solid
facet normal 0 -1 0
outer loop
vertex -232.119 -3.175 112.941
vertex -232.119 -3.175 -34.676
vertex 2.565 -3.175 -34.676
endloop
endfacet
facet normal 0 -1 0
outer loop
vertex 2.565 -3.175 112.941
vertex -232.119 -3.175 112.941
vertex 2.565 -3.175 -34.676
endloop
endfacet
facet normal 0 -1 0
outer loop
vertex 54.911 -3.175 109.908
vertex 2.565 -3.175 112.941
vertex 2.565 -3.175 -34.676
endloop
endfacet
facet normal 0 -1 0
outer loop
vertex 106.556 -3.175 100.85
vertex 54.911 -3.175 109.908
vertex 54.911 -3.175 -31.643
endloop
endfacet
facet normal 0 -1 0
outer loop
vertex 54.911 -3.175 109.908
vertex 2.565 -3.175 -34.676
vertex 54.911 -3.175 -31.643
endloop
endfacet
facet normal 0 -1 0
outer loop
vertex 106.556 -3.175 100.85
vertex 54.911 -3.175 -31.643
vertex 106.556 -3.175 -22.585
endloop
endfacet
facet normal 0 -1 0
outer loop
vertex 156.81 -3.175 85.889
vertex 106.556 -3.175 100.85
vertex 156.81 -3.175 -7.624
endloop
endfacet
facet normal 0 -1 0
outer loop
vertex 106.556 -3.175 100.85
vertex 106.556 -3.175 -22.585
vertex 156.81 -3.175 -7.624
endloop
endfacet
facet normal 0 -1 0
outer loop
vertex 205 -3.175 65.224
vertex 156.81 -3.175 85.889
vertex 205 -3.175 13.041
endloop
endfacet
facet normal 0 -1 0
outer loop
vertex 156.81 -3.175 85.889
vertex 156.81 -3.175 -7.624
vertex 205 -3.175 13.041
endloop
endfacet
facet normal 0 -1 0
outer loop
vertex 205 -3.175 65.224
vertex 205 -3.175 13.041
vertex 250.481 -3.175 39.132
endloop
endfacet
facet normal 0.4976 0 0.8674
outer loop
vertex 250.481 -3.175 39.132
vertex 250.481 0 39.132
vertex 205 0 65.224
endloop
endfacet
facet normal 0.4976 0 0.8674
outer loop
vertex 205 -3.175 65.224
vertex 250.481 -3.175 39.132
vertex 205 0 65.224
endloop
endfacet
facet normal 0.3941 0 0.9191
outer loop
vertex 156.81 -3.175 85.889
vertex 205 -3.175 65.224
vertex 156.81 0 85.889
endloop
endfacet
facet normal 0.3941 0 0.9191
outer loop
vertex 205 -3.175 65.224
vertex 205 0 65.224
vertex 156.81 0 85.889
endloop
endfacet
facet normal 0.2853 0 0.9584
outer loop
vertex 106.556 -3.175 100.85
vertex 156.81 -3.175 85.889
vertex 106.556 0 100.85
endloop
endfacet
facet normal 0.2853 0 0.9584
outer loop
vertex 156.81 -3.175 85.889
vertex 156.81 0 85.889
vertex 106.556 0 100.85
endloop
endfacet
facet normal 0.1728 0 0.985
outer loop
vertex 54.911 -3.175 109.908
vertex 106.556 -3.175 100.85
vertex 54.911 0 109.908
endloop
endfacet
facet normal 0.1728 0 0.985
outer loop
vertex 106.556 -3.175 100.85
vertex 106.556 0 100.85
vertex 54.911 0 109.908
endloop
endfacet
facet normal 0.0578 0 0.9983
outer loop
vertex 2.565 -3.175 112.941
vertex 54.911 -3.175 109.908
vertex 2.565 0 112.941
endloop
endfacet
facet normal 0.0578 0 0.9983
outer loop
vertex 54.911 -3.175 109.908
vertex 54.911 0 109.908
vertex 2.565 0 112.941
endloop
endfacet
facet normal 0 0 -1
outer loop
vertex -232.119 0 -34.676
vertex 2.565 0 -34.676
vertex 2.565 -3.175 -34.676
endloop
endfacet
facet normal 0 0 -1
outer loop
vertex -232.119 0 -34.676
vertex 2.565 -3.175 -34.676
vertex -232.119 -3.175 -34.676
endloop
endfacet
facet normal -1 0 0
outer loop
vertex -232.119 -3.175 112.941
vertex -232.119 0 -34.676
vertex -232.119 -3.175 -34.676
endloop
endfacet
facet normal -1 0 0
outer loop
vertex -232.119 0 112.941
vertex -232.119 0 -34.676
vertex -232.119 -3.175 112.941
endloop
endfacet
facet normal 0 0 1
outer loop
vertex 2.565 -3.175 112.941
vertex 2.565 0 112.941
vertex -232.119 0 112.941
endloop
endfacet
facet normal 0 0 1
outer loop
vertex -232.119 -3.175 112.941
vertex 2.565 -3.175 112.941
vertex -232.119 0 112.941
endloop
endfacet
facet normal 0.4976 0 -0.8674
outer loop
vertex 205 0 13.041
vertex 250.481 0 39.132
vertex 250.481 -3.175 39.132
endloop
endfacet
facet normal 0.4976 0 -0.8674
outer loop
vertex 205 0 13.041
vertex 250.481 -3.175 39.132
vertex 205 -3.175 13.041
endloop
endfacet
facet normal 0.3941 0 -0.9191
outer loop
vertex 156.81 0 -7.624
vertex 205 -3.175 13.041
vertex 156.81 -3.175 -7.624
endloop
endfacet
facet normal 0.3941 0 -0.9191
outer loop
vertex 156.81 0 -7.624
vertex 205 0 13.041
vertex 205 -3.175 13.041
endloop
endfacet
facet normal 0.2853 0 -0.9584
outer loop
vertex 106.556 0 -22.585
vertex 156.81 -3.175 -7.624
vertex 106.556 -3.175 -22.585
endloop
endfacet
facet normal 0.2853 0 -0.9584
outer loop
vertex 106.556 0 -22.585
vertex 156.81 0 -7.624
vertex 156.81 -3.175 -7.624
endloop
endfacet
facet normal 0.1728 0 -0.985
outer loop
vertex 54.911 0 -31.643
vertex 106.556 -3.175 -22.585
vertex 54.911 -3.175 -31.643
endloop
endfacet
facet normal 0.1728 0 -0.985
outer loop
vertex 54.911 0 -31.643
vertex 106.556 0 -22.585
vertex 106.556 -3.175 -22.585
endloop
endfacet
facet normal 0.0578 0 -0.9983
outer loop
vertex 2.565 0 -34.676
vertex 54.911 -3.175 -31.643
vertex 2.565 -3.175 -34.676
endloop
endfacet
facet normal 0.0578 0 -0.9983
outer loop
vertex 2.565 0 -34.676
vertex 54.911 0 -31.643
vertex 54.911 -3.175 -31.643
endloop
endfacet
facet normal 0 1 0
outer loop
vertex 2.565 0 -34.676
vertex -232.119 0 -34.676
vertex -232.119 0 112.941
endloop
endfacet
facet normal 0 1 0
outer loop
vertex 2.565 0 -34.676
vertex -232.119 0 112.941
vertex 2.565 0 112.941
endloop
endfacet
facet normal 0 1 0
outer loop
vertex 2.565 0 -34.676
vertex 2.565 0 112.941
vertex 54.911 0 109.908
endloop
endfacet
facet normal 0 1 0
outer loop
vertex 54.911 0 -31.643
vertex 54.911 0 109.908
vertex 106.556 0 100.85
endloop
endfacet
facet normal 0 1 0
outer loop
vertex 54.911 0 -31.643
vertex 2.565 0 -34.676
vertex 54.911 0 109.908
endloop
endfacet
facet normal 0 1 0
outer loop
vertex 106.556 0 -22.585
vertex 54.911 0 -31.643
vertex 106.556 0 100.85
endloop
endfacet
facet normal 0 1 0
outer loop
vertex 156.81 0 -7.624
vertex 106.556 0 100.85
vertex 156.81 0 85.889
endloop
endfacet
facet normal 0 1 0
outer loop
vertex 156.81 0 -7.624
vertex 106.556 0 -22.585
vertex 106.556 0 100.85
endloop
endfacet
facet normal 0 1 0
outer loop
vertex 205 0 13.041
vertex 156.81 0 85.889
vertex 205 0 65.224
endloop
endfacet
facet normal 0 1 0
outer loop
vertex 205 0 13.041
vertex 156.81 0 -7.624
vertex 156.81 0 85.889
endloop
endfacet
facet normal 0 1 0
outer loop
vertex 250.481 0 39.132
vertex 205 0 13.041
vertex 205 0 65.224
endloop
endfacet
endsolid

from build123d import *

# Parameters (mm, degrees)
F1_DEPTH = 3.175


with BuildPart() as f1:
    # F0 (on Front) → F1 (new body)
    with BuildSketch(Plane.XZ):
        with BuildLine():
            Line((-232.119275, 112.940714), (-232.119275, 39.1325))
            Line((-232.119275, 39.1325), (250.480725, 39.1325))
            ThreePointArc((250.480725, 39.1325), (131.899672, 94.096964), (2.564945, 112.940714))
            Line((2.564945, 112.940714), (-232.119275, 112.940714))
        make_face()
    extrude(amount=F1_DEPTH)

    # F2: F1 across face


with BuildPart() as f1_1:
    add(f1.part)
    add(f1.part.mirror(Plane(origin=(9.180725, -1.5875, 39.1325), x_dir=(1, 0, 0), z_dir=(0, 0, -1))))


solid = f1_1.part
